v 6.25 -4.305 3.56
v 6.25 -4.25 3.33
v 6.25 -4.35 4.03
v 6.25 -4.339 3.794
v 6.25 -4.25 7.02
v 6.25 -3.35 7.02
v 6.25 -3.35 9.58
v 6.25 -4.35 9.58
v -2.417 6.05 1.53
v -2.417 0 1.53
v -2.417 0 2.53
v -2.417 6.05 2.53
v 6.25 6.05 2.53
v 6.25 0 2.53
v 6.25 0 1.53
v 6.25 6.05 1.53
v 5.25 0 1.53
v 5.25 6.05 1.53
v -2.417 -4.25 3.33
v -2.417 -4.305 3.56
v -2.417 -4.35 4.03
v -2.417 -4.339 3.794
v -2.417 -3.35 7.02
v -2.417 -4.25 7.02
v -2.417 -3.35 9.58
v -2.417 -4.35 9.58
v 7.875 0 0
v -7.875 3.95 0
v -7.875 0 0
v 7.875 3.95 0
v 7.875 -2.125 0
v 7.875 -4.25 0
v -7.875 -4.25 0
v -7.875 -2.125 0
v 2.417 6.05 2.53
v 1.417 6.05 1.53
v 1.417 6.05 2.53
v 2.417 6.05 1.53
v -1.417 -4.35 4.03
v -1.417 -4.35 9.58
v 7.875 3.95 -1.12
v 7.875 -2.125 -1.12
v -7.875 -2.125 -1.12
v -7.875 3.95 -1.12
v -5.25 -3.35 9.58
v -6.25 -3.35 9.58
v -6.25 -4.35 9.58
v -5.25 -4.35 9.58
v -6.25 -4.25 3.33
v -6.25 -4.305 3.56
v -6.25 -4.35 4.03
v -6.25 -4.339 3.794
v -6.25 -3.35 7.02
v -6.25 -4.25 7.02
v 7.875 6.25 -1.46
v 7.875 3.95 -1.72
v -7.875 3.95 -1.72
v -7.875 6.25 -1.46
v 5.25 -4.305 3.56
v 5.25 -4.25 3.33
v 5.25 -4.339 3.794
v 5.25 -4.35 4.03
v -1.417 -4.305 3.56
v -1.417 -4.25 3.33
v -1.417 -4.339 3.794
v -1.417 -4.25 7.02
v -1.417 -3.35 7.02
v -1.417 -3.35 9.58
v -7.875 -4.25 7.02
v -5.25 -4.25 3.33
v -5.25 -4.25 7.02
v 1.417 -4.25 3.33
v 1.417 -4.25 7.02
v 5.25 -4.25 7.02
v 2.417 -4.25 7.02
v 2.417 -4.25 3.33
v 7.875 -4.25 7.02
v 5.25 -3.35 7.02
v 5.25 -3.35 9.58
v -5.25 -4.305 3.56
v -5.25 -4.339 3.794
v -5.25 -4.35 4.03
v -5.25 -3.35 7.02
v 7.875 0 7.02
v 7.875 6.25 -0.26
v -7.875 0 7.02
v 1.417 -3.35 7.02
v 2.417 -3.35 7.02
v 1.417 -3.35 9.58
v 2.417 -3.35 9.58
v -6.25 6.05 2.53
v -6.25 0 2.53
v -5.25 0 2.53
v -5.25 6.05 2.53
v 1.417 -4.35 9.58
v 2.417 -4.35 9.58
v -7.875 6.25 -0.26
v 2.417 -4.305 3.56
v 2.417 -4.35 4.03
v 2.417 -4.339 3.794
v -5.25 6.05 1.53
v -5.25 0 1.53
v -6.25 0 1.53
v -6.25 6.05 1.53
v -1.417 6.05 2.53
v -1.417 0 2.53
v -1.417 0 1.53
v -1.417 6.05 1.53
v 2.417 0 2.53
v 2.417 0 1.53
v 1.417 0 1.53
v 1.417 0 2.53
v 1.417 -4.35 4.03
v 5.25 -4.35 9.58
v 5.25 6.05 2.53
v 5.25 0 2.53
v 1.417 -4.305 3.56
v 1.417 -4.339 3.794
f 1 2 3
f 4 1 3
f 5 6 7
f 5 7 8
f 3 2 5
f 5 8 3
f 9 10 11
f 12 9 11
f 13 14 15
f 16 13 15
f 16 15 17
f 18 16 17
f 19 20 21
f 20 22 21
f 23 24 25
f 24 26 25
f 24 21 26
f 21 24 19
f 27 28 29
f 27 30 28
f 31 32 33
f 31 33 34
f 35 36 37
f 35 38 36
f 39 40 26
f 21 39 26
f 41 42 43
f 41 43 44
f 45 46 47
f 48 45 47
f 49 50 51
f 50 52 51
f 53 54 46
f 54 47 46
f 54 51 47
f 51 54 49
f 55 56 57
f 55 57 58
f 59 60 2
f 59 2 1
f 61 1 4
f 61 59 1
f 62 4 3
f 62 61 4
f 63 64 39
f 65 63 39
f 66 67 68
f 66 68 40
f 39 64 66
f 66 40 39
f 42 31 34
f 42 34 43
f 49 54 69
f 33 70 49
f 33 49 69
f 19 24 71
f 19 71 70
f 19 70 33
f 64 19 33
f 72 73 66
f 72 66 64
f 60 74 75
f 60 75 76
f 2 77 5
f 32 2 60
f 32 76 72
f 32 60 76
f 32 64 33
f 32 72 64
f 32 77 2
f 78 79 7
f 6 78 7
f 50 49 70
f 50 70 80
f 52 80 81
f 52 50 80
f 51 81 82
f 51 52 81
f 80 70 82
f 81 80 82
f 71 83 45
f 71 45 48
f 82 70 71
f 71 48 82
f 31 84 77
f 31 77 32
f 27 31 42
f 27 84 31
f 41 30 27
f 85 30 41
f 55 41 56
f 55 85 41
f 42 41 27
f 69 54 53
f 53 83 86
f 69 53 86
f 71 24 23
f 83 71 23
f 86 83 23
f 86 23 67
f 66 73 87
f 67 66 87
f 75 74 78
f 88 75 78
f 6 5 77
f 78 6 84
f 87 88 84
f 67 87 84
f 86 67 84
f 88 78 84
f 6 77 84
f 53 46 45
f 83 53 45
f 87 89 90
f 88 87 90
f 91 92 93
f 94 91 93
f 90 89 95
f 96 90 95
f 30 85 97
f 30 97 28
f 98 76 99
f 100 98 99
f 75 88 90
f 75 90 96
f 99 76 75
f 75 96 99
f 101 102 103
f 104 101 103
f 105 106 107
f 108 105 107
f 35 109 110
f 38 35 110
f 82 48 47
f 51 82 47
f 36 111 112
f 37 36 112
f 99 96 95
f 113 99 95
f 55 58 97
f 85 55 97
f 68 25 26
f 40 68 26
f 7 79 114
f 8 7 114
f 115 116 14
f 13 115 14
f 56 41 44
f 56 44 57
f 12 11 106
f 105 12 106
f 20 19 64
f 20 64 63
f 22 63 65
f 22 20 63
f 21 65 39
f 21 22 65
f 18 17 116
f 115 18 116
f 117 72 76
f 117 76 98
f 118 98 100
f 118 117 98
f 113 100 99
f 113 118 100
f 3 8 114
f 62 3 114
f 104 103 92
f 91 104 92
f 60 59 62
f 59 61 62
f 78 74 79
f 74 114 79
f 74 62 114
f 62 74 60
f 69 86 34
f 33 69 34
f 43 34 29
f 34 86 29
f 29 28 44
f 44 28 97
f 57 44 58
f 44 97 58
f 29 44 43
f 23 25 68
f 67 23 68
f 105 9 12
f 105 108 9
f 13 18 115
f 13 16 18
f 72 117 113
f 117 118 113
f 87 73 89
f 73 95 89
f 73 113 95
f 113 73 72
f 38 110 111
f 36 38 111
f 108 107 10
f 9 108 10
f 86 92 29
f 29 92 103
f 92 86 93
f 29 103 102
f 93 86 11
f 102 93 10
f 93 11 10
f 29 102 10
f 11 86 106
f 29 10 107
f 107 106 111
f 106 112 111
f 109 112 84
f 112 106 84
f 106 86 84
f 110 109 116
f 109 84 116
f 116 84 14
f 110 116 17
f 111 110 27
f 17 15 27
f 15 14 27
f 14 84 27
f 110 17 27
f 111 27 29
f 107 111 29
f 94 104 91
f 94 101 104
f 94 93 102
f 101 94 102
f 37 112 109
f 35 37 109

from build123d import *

# Parameters (mm, degrees)
SKETCH2_W           = 7.02
SKETCH2_H           = 4.25
BOSS_EXTRUDE1_DEPTH = 7.875
SKETCH4_W           = 1
SKETCH4_H           = 1
LPATTERN1_COUNT     = 4
LPATTERN1_PITCH     = 3.833333333


with BuildPart() as part:
    # Sketch2 → Boss-Extrude1 (new, symmetric)
    with BuildSketch(Plane(origin=(0, 0, 0), x_dir=(0, 0, -1), z_dir=(1, 0, 0))):
        with Locations((-3.51, -2.125)):
            Rectangle(SKETCH2_W, SKETCH2_H)
        Polygon((0, 3.95), (0, 0), (0, -2.125), (1.12, -2.125), (1.12, 3.95), (1.72, 3.95), (1.46, 6.25), (0.26, 6.25), align=None)
    extrude(amount=BOSS_EXTRUDE1_DEPTH, both=True)

    # Sweep1: sweep along a path in Sketch3
    with BuildLine(Plane(origin=(5.75, 0, 0), x_dir=(0, 0, -1), z_dir=(1, 0, 0))) as sweep1_path:
        Line((-2.03, 6.05), (-2.03, -1.85))
        ThreePointArc((-2.03, -1.85), (-2.615786438, -3.264213562), (-4.03, -3.85))
        Line((-4.03, -3.85), (-9.58, -3.85))
    # Sketch4 → Sweep1 (sweep)
    with BuildSketch(Plane(origin=(0, 6.05, 0), x_dir=(1, 0, 0), z_dir=(0, 1, 0))):
        with Locations((5.75, -2.03)):
            Rectangle(SKETCH4_W, SKETCH4_H)
    sweep1 = sweep(path=sweep1_path.line)

    # LPattern1: Sweep1 ×4
    with Locations(*[(-i * LPATTERN1_PITCH, 0, 0) for i in range(1, LPATTERN1_COUNT)]):
        add(sweep1)


solid = part.part
